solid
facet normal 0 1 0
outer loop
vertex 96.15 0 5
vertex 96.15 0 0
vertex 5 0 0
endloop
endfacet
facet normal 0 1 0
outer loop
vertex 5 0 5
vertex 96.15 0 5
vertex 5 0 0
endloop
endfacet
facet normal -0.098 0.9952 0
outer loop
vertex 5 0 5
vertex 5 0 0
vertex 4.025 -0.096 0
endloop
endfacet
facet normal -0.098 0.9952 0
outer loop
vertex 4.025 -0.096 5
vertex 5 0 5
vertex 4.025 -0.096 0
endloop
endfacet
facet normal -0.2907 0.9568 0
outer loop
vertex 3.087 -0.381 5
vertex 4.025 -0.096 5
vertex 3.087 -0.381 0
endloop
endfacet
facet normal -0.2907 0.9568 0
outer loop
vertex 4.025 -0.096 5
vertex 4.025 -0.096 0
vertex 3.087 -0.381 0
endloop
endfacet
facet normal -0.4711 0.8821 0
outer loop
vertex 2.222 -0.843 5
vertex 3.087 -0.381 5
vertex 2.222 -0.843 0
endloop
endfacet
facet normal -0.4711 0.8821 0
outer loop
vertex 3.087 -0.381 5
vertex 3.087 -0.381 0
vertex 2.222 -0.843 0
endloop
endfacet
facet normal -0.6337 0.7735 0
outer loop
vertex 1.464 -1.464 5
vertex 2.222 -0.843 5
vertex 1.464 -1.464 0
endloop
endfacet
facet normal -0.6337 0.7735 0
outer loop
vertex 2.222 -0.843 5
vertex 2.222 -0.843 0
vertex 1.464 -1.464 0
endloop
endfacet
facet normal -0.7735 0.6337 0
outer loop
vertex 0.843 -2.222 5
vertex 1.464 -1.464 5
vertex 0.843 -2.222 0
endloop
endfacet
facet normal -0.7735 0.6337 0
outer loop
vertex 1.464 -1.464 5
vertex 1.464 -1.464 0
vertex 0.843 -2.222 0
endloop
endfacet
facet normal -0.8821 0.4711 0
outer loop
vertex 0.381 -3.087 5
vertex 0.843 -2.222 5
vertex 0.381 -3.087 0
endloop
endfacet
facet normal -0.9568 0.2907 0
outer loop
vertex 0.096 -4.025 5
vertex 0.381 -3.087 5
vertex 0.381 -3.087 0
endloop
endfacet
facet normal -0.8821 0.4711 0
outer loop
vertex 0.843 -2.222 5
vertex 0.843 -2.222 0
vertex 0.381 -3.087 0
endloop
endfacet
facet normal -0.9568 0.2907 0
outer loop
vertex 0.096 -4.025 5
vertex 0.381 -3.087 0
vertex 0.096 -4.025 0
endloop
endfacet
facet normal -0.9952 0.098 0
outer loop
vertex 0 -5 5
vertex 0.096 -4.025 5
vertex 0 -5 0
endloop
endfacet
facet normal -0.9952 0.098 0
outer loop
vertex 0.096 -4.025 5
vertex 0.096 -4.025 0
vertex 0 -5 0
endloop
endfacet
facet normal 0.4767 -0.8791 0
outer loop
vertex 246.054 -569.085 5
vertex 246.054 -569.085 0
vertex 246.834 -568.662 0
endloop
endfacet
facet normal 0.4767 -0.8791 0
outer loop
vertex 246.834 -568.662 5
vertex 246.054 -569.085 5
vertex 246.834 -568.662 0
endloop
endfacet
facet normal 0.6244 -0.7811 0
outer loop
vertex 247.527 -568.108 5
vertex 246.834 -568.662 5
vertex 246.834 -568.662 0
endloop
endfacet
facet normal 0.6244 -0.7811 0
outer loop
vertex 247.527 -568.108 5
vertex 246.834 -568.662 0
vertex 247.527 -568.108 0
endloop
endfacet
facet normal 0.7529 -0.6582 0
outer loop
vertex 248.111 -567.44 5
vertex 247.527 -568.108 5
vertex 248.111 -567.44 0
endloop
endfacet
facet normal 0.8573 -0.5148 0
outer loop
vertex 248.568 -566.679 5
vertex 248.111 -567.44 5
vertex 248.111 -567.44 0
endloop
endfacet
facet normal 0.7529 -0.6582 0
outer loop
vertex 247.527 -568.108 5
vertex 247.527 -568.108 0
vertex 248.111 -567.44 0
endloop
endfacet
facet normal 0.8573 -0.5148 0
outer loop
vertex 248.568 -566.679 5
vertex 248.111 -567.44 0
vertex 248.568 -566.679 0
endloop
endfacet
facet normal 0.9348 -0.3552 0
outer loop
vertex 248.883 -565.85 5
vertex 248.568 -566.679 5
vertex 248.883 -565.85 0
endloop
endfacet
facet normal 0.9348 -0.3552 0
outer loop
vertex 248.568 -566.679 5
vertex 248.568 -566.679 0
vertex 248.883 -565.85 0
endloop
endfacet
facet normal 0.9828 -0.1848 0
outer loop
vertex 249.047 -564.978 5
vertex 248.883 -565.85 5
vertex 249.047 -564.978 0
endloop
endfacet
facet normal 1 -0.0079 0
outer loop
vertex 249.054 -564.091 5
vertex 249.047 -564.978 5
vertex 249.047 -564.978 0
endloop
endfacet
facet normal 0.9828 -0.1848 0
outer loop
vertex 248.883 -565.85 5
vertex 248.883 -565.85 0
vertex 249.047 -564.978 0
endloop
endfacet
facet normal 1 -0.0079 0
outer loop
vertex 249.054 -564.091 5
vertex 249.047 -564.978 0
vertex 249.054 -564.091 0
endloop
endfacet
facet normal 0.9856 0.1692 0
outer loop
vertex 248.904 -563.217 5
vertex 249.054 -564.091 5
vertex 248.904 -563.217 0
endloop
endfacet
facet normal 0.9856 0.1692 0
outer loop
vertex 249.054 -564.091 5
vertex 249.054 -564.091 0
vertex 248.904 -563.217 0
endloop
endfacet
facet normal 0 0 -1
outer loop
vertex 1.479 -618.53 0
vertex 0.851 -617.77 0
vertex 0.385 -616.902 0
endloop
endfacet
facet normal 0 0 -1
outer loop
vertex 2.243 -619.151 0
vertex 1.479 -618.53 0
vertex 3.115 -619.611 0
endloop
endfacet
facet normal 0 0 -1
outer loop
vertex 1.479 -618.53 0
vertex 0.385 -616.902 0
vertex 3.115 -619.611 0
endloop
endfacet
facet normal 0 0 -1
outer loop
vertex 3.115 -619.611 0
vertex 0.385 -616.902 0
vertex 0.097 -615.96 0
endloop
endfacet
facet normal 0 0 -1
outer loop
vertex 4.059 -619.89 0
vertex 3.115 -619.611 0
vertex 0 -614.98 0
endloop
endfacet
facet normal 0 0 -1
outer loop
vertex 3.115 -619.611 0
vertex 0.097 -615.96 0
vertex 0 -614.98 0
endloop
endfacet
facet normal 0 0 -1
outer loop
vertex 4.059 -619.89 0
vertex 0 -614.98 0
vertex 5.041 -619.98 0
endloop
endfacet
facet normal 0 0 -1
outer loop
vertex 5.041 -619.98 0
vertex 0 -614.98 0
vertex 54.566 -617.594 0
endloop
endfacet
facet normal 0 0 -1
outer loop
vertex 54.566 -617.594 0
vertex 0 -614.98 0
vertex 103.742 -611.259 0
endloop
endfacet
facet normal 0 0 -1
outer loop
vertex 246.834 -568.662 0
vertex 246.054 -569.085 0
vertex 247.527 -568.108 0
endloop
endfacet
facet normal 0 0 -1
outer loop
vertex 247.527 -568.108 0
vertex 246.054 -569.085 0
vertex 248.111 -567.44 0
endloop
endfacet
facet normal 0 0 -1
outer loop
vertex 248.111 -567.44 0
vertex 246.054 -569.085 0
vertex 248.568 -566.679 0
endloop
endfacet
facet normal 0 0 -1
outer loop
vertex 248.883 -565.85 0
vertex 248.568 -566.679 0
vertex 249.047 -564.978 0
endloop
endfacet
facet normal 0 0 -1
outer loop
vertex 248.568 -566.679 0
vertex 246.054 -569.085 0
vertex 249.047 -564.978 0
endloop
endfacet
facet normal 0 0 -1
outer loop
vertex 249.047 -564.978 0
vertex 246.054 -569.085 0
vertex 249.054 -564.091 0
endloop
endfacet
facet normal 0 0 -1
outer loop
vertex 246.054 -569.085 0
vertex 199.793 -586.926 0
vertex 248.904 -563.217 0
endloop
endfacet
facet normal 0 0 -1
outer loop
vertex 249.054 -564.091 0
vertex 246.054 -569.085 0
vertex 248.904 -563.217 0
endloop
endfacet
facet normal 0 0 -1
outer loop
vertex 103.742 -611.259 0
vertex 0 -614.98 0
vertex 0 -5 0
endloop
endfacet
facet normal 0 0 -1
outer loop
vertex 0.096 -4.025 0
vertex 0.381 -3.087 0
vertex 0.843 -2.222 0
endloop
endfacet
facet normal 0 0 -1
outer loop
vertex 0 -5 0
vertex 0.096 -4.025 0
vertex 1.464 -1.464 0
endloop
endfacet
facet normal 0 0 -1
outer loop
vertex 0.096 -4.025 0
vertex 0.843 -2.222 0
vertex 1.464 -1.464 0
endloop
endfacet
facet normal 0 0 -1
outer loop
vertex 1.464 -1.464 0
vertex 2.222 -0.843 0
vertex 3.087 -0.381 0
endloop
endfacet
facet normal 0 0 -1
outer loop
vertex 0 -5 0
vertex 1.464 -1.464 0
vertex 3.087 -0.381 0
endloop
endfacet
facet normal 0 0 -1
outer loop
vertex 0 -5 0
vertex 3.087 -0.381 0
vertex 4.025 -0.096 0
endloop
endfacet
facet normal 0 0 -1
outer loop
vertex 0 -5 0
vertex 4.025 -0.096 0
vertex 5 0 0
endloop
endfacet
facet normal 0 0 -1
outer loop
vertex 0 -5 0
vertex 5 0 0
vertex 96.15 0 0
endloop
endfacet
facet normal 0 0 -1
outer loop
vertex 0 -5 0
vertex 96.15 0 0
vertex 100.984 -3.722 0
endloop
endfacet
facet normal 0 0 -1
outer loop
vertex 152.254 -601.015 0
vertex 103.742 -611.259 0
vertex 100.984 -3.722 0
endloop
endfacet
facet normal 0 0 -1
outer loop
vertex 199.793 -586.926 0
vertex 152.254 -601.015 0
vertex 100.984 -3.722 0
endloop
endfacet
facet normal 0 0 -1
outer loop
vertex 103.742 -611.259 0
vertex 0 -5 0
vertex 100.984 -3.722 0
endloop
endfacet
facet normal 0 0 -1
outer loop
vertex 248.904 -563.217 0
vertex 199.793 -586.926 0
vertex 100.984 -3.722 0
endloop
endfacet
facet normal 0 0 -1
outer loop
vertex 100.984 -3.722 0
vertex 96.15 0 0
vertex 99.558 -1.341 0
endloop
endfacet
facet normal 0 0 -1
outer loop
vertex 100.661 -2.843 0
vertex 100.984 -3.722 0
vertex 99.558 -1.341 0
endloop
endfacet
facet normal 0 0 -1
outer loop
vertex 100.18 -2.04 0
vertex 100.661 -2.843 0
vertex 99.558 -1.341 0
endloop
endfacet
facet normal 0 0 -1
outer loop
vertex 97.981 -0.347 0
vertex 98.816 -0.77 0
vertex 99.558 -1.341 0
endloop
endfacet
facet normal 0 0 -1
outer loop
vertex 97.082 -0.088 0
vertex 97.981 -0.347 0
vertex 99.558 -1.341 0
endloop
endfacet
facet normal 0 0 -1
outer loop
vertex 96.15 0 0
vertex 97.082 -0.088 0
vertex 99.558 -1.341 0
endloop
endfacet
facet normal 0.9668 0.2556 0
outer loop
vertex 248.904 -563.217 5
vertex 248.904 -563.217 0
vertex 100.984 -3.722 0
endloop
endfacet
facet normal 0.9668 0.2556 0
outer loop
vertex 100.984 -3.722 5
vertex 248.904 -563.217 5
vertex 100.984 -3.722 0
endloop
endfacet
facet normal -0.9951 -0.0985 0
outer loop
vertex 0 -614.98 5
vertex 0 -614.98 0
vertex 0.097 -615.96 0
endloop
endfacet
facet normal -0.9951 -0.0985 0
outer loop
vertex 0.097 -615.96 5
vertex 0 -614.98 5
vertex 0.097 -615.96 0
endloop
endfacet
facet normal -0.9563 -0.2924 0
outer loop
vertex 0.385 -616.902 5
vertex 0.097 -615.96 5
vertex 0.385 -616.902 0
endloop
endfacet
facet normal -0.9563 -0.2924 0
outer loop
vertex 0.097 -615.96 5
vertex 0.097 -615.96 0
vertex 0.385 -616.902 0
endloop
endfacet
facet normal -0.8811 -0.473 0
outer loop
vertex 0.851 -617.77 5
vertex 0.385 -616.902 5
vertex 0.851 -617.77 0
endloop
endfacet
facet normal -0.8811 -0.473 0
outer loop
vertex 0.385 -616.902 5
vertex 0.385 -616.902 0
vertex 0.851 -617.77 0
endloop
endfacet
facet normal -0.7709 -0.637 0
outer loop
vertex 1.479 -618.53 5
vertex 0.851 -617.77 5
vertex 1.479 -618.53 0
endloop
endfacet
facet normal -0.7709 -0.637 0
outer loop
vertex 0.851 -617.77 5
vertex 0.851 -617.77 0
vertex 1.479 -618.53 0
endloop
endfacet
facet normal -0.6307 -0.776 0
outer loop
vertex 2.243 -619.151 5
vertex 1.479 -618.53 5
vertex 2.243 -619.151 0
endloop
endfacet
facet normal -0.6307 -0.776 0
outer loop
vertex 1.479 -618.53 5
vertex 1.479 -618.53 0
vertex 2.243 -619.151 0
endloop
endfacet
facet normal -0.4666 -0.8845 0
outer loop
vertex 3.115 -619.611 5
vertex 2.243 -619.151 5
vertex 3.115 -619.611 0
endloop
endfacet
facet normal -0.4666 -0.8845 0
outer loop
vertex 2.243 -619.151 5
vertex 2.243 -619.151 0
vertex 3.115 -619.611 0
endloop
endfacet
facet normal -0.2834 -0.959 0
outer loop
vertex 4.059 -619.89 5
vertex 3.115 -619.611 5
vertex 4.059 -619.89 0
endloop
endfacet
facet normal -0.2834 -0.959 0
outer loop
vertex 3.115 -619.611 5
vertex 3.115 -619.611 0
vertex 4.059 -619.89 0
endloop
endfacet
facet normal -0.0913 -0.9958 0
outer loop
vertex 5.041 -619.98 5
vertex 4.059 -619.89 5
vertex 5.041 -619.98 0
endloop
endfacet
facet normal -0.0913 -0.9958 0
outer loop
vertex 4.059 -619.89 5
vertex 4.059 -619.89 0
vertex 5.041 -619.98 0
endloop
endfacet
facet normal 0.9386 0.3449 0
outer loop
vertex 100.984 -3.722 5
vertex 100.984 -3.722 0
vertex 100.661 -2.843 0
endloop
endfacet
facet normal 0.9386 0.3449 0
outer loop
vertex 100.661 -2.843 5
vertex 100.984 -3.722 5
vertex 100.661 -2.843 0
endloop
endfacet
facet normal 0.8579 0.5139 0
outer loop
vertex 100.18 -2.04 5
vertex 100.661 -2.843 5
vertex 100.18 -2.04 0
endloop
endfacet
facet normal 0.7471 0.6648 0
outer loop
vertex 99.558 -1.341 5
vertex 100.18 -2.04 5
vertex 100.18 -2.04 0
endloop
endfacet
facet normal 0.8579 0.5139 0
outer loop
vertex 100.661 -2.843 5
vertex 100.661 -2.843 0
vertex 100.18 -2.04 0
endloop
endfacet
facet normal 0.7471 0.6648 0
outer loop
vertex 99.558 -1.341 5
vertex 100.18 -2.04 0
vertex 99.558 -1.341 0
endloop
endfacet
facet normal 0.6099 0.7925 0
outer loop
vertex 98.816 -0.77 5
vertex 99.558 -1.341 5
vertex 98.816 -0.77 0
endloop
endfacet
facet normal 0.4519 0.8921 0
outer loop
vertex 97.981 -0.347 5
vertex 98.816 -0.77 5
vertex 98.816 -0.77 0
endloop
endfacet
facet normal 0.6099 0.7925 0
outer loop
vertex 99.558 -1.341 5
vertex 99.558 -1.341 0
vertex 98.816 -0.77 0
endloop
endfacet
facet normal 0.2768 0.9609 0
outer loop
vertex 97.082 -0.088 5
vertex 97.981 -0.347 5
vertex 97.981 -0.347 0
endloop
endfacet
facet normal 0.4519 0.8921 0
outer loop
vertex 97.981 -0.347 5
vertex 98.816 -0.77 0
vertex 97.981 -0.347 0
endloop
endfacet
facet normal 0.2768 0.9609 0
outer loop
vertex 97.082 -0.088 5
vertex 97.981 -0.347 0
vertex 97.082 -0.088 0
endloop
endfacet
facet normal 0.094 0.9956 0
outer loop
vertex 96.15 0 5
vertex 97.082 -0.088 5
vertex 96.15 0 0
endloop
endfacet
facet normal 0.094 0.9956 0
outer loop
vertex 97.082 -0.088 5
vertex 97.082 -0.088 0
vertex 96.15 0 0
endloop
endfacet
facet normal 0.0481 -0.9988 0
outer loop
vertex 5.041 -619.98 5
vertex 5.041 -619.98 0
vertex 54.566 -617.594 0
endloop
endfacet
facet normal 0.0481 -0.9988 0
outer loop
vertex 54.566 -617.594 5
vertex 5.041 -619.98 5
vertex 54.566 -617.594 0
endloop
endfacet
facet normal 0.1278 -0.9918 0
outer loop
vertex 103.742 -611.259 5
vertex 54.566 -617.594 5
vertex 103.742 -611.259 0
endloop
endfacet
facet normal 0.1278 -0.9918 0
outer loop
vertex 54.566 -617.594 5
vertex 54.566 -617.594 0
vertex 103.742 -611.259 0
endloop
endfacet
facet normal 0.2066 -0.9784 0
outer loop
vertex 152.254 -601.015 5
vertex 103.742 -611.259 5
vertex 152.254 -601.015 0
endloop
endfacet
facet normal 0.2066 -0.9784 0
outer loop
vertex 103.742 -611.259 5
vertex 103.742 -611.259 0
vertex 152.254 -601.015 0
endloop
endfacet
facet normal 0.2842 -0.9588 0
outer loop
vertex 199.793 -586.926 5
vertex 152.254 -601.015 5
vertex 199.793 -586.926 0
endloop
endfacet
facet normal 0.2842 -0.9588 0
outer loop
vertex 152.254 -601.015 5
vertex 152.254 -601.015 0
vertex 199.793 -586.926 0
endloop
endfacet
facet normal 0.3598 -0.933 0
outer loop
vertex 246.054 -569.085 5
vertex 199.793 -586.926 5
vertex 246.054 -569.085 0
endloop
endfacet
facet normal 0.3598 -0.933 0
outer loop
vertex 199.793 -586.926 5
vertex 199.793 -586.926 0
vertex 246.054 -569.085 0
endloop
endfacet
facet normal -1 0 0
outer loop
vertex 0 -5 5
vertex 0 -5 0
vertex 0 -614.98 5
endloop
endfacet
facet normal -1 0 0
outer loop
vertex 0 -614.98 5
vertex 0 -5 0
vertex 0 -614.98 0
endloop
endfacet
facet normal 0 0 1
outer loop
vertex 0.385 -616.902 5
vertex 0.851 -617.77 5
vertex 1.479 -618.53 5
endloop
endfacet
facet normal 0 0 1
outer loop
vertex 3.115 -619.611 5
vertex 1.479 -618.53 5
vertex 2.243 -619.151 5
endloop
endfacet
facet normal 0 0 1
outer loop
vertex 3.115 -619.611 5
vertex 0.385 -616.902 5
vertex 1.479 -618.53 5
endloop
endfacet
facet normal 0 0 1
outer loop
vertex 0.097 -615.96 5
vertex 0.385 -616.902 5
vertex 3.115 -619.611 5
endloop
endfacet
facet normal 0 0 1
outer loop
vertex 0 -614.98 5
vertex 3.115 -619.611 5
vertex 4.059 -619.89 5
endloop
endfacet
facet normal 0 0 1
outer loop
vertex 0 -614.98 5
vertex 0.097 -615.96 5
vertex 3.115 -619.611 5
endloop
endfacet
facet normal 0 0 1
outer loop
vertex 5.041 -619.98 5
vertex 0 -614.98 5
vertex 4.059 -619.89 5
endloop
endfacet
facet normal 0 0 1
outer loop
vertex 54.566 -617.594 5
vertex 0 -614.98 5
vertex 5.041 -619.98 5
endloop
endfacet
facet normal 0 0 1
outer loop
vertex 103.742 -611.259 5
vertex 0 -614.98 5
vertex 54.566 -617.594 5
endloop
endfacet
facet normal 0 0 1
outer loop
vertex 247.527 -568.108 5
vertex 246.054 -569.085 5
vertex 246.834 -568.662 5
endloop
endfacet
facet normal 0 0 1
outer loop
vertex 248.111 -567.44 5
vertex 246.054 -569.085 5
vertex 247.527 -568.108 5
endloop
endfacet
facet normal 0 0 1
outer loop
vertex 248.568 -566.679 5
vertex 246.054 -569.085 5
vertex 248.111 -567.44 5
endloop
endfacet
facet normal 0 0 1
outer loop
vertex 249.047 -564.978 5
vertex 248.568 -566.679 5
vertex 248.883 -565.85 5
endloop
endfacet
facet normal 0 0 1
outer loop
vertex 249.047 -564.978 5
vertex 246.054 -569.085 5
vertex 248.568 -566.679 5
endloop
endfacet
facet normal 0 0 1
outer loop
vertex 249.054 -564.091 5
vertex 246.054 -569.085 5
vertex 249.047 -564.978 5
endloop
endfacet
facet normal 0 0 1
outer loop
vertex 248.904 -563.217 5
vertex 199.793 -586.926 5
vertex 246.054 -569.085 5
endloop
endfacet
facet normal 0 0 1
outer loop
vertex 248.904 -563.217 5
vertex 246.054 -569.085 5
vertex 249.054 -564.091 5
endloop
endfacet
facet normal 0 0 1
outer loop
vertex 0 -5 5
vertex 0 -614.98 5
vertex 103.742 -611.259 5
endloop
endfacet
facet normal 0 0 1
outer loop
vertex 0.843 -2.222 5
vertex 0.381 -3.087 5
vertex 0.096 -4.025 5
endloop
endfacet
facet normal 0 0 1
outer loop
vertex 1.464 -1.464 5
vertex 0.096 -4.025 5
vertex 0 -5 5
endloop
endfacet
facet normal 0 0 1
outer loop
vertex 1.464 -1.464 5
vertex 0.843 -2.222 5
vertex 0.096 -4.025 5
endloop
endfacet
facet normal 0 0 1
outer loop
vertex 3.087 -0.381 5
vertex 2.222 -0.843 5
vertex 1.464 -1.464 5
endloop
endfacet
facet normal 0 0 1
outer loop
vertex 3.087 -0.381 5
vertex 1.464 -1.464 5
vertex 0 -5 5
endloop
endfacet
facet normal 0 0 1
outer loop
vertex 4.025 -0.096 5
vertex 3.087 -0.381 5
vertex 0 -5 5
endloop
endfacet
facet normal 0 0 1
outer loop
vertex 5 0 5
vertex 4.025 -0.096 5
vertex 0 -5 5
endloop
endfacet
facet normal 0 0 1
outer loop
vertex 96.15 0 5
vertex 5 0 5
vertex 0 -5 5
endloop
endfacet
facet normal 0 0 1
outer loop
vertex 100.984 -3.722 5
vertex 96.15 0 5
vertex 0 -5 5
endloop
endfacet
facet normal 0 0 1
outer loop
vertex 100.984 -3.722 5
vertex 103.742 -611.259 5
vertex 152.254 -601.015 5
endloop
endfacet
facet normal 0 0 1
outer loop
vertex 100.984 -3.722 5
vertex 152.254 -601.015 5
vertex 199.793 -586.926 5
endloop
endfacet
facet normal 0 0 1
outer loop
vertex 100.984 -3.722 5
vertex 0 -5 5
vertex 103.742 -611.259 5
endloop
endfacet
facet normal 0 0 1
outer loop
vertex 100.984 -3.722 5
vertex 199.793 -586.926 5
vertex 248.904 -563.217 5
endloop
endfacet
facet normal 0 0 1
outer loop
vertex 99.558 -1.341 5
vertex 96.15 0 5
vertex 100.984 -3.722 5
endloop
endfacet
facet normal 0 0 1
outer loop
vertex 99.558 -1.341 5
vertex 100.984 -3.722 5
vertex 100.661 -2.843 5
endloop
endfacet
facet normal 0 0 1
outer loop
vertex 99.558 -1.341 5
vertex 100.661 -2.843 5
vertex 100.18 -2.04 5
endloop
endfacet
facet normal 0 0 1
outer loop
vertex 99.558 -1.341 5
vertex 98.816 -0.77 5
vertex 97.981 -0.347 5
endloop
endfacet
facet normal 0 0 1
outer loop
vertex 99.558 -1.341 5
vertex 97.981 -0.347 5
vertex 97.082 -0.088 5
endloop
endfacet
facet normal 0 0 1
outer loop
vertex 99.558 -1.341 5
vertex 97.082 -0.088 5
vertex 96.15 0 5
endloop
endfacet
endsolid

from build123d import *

# Parameters (mm, degrees)
F1_DEPTH = 5


with BuildPart() as f1:
    # F0 (on Top) → F1 (new body)
    with BuildSketch(Plane.XY):
        with BuildLine():
            ThreePointArc((5, 0), (1.464466, -1.464466), (0, -5))
            Line((0, -5), (0, -614.979674))
            ThreePointArc((0, -614.979674), (1.478868, -618.529551), (5.04065, -619.979509))
            ThreePointArc((5.04065, -619.979509), (128.100613, -606.621985), (246.054486, -569.084519))
            ThreePointArc((246.054486, -569.084519), (248.567798, -566.67948), (248.90409, -563.217131))
            Line((248.90409, -563.217131), (100.984028, -3.722003))
            ThreePointArc((100.984028, -3.722003), (99.200525, -1.03831), (96.150114, 0))
            Line((96.150114, 0), (5, 0))
        make_face()
    extrude(amount=F1_DEPTH)


solid = f1.part
